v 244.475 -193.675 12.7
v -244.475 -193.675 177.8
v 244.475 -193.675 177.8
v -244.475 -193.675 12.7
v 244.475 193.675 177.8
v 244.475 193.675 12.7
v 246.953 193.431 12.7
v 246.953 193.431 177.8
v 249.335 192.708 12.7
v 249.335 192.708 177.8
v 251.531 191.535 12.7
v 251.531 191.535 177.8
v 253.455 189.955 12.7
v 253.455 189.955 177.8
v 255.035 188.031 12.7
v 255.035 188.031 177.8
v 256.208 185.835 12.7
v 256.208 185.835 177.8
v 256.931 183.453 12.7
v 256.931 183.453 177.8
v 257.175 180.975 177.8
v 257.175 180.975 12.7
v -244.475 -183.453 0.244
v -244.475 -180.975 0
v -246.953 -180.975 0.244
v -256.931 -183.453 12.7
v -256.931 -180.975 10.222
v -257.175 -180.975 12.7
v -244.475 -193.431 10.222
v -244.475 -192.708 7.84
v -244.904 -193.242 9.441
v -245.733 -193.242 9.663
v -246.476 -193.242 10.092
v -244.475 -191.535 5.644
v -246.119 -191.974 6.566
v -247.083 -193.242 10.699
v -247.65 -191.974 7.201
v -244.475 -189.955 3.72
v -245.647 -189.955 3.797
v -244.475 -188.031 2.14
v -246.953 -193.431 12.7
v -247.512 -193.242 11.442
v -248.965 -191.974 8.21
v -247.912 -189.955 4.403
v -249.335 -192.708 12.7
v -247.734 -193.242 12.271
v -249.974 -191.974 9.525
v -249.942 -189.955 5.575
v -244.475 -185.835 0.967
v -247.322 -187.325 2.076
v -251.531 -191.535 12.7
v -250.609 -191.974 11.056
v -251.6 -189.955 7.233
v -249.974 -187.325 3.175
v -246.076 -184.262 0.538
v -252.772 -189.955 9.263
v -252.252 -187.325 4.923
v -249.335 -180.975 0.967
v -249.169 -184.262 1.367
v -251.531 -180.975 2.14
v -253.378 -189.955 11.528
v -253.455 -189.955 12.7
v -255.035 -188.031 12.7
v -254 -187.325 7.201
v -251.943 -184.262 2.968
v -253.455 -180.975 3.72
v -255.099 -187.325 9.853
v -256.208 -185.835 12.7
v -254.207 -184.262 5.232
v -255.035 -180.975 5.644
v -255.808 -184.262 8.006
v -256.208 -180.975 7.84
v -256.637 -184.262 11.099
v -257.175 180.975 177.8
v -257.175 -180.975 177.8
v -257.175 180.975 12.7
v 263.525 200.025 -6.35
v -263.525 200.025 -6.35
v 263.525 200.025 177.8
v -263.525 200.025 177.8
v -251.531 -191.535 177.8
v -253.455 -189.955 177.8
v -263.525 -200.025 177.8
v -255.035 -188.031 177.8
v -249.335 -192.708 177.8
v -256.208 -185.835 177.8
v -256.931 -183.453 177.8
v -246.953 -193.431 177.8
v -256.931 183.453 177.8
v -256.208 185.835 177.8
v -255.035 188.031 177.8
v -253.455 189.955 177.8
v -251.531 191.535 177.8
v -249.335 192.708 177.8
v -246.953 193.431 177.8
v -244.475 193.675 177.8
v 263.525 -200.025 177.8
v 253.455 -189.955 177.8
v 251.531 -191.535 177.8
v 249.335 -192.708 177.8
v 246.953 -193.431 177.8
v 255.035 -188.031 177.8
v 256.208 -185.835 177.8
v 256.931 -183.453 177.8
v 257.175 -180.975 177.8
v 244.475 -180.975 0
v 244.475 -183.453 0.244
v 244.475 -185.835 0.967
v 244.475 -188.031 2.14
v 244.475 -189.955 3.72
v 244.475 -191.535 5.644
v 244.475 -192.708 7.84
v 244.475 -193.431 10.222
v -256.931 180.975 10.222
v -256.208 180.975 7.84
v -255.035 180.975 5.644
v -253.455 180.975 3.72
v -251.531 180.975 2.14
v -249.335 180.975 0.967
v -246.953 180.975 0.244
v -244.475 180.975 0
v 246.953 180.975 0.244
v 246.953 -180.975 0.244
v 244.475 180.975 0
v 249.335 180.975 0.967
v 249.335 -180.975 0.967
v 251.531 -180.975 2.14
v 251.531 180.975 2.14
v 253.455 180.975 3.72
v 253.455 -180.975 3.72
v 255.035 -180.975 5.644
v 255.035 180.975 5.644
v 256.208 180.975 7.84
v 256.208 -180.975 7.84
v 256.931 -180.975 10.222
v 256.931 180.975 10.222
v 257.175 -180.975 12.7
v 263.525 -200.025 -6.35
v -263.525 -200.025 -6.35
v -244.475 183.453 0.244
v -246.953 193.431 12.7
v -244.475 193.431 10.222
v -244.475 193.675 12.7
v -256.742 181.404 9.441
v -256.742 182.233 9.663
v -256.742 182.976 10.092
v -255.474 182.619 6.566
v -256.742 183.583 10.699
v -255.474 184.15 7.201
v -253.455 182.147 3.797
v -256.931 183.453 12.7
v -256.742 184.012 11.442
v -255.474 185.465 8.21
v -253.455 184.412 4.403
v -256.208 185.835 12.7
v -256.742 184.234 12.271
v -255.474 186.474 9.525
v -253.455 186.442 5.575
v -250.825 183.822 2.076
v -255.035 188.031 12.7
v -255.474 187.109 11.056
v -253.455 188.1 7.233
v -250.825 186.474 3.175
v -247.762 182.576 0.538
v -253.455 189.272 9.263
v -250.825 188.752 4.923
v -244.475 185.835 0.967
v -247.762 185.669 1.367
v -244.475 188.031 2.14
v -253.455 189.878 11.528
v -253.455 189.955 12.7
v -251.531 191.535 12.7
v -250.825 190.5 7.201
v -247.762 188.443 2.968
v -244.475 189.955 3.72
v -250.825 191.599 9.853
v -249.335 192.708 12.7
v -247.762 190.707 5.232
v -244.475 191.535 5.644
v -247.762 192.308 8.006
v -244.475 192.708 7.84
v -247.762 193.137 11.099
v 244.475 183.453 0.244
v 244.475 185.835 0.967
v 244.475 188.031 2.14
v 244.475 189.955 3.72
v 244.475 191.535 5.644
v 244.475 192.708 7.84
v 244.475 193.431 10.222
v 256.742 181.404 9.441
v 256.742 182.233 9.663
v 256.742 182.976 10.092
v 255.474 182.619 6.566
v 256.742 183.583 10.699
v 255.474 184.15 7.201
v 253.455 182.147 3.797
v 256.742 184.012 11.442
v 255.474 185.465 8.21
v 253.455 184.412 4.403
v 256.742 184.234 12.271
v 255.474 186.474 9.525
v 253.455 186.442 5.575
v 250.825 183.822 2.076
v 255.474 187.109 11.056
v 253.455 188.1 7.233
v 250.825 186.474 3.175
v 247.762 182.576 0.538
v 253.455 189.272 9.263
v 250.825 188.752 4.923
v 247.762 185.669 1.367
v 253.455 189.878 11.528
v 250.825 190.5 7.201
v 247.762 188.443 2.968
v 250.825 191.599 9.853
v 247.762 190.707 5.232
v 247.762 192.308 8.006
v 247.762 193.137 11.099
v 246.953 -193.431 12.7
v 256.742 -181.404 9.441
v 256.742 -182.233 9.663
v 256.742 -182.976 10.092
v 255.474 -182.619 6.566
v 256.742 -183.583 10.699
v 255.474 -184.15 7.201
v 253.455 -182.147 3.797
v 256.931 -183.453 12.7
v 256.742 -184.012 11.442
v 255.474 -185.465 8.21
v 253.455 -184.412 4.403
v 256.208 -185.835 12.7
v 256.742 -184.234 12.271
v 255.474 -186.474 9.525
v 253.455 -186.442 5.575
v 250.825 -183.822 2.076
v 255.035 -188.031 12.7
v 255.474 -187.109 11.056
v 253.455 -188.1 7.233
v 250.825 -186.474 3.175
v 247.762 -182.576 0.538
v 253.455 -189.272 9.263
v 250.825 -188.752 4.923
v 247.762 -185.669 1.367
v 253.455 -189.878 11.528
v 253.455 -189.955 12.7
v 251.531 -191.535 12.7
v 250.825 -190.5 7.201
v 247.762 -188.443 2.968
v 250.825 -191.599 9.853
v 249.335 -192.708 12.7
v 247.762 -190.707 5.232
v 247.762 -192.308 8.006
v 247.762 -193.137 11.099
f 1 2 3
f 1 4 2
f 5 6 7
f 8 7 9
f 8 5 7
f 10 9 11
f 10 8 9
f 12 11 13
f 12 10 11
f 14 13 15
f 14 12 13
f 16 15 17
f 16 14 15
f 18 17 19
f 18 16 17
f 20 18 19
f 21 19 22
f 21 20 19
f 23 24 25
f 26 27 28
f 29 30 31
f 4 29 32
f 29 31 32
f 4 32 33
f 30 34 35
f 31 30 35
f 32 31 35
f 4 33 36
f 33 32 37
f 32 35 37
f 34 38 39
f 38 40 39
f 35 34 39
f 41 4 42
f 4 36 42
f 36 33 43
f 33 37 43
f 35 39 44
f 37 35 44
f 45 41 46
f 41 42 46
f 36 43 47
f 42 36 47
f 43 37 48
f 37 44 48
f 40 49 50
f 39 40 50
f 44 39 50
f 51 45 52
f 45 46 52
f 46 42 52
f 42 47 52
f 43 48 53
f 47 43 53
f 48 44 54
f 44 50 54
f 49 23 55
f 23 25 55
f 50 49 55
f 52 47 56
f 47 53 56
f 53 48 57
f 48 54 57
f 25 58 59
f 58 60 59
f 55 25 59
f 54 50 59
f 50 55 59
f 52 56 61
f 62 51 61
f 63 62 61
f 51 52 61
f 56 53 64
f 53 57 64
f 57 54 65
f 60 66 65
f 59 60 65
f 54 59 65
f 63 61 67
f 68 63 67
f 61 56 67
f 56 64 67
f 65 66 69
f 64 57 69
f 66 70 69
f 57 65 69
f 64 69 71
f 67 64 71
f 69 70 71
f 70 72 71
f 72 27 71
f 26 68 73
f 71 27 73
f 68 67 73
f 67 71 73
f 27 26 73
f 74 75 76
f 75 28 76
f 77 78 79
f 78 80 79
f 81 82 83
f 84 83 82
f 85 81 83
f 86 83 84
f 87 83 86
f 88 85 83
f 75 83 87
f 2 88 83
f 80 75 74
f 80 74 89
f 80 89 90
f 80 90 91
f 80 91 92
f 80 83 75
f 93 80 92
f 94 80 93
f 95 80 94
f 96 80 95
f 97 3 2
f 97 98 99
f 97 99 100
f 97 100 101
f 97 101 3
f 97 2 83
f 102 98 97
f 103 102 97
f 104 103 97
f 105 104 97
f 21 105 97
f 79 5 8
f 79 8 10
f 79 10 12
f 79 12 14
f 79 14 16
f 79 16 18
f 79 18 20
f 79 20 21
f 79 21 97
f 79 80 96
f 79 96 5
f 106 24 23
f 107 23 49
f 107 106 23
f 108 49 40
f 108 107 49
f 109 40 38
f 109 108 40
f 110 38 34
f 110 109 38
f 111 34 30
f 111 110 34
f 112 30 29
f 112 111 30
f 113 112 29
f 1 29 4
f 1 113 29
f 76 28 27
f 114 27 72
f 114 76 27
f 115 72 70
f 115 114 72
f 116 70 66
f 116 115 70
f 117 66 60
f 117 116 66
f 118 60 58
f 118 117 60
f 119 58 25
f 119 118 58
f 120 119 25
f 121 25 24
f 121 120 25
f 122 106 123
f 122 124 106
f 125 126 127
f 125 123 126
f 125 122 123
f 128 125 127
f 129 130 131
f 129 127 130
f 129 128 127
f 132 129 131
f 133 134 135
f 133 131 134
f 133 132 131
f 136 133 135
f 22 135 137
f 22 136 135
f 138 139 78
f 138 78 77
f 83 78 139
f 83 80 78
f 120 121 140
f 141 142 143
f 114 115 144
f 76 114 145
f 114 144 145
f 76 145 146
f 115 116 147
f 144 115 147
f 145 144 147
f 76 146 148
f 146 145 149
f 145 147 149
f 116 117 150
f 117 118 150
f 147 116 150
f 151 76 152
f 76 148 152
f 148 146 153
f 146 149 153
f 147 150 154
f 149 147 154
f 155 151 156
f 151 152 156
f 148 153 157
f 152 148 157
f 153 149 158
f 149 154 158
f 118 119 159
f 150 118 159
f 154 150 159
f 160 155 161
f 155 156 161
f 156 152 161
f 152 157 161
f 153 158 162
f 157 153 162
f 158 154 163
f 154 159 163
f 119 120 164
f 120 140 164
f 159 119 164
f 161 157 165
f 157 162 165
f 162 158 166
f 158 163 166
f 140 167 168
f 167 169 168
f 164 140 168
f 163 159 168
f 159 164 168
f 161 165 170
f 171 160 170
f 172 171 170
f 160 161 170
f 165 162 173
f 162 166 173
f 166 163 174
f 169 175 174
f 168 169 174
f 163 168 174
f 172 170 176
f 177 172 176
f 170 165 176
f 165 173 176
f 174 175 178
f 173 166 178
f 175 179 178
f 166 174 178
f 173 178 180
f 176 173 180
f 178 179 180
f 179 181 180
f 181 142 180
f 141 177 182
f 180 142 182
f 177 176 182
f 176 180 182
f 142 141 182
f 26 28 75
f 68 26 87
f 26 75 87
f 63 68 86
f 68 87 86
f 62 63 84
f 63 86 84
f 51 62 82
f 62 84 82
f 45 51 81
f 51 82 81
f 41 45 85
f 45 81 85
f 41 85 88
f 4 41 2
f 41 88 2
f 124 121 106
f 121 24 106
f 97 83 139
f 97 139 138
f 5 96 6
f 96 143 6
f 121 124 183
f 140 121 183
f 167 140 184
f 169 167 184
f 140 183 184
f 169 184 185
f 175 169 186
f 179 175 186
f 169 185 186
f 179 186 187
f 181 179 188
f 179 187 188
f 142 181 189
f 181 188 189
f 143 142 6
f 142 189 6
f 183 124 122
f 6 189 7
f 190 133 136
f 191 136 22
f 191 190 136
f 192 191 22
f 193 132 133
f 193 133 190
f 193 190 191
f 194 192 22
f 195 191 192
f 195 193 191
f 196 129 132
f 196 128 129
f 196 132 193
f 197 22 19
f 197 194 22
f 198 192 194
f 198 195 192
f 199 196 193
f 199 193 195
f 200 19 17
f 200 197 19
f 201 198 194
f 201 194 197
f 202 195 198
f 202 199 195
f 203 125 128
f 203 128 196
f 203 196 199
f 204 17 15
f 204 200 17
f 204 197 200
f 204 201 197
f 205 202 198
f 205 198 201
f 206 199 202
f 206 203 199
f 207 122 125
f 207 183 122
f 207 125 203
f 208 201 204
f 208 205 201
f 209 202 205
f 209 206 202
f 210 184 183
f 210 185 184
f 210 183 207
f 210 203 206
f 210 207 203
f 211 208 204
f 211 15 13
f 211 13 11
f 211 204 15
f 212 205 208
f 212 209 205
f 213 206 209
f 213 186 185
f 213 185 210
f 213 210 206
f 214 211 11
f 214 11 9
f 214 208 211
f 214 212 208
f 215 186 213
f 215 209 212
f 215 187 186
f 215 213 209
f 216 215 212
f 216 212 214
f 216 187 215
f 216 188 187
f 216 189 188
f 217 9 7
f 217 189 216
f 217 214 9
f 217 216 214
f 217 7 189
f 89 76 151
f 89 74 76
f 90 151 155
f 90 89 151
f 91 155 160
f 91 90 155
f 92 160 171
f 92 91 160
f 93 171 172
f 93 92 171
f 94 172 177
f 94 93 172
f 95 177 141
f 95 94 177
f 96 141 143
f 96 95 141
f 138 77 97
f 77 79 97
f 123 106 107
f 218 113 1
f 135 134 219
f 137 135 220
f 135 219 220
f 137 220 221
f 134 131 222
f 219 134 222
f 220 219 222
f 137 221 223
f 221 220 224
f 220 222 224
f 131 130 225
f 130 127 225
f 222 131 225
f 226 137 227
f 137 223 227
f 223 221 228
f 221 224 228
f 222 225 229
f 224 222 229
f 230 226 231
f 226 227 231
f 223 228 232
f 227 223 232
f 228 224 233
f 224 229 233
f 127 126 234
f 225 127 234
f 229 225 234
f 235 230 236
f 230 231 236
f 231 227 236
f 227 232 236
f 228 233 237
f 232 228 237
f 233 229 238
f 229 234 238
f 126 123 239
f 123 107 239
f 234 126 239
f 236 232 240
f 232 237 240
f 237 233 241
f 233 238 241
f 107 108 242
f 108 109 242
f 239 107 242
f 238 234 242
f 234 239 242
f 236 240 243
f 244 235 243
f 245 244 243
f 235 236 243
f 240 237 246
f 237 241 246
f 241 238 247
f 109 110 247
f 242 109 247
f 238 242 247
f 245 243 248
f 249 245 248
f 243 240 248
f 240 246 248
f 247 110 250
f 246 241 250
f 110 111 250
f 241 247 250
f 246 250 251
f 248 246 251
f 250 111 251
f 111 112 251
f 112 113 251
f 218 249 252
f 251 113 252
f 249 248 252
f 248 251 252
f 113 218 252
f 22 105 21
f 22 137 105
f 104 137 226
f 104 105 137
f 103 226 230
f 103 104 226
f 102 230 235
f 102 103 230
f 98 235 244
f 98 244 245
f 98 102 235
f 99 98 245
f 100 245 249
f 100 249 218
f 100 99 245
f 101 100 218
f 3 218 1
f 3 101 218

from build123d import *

# Parameters (mm, degrees)
F0_W     = 527.05
F0_H     = 400.05
F0_W_2   = 514.35
F0_H_2   = 387.35
F1_DEPTH = 177.8
F2_W     = 527.05
F2_H     = 400.05
F3_DEPTH = 6.35
F4_R     = 12.7


with BuildPart() as f1:
    # F0 (on Top) → F1 (new body)
    with BuildSketch(Plane.XY):
        Rectangle(F0_W, F0_H)
        Rectangle(F0_W_2, F0_H_2, mode=Mode.SUBTRACT)
    extrude(amount=F1_DEPTH)

    # F2 (on face) → F3 (join)
    with BuildSketch(Plane(origin=(0, 0, 0), x_dir=(1, 0, 0), z_dir=(0, 0, -1))):
        Rectangle(F2_W, F2_H)
    extrude(amount=F3_DEPTH)

    # F4
    f4_edges = [f1.edges().sort_by_distance(p)[0] for p in [
        (0, 193.675, 0),
        (-257.175, 0, 0),
        (0, -193.675, 0),
        (257.175, 0, 0),
        (-257.175, 193.675, 88.9),
        (-257.175, -193.675, 88.9),
        (257.175, -193.675, 88.9),
        (257.175, 193.675, 88.9),
    ]]
    fillet(f4_edges, radius=F4_R)


solid = f1.part
